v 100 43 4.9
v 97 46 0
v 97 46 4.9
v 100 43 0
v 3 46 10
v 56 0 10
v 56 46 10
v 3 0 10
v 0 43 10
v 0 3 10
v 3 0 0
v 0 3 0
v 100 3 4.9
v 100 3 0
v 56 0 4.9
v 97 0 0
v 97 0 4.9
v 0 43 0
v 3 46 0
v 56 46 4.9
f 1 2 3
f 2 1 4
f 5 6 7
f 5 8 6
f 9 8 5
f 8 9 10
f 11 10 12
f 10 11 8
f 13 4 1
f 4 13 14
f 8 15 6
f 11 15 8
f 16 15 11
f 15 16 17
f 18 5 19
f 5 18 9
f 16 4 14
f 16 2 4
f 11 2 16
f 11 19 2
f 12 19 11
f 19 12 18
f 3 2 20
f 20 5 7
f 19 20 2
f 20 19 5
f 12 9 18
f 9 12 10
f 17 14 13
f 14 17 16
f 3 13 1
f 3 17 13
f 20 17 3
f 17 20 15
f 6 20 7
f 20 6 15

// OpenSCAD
$fn = 32;

// ----------------------------------------------------------------------
// Stepped bar: endstep, 100 x 46 x 10/4.9 mm
// ----------------------------------------------------------------------

// --- parameters (mm) ---
bar_l = 100;              // bar length, X
bar_w = 46;               // bar width, Y
plate_t = 10;             // thickness of the thick zone, Z
thin_t = 4.9;             // thickness of the thin zone
corner_c = 3;             // corner chamfer of the bar
step_cut = 5.1;           // material removed from the thin zone
step_x = 56;              // step position from the left end
depth_1 = 5.1;            // depth of cut 1 from the top face

profile = [[3, 0], [97, 0], [100, 3], [100, 43], [97, 46], [3, 46], [0, 43], [0, 3]];  // primary outline, 8 points, counter clockwise
void_1 = [[56, -1], [101, -1], [101, 47], [56, 47]];  // thin zone beyond the step, 4 points

// --- the one profile operation ---
difference() {
  linear_extrude(height = plate_t) polygon(points = profile);
  translate([0, 0, plate_t - depth_1])
    linear_extrude(height = depth_1 + 1) polygon(points = void_1);
}
